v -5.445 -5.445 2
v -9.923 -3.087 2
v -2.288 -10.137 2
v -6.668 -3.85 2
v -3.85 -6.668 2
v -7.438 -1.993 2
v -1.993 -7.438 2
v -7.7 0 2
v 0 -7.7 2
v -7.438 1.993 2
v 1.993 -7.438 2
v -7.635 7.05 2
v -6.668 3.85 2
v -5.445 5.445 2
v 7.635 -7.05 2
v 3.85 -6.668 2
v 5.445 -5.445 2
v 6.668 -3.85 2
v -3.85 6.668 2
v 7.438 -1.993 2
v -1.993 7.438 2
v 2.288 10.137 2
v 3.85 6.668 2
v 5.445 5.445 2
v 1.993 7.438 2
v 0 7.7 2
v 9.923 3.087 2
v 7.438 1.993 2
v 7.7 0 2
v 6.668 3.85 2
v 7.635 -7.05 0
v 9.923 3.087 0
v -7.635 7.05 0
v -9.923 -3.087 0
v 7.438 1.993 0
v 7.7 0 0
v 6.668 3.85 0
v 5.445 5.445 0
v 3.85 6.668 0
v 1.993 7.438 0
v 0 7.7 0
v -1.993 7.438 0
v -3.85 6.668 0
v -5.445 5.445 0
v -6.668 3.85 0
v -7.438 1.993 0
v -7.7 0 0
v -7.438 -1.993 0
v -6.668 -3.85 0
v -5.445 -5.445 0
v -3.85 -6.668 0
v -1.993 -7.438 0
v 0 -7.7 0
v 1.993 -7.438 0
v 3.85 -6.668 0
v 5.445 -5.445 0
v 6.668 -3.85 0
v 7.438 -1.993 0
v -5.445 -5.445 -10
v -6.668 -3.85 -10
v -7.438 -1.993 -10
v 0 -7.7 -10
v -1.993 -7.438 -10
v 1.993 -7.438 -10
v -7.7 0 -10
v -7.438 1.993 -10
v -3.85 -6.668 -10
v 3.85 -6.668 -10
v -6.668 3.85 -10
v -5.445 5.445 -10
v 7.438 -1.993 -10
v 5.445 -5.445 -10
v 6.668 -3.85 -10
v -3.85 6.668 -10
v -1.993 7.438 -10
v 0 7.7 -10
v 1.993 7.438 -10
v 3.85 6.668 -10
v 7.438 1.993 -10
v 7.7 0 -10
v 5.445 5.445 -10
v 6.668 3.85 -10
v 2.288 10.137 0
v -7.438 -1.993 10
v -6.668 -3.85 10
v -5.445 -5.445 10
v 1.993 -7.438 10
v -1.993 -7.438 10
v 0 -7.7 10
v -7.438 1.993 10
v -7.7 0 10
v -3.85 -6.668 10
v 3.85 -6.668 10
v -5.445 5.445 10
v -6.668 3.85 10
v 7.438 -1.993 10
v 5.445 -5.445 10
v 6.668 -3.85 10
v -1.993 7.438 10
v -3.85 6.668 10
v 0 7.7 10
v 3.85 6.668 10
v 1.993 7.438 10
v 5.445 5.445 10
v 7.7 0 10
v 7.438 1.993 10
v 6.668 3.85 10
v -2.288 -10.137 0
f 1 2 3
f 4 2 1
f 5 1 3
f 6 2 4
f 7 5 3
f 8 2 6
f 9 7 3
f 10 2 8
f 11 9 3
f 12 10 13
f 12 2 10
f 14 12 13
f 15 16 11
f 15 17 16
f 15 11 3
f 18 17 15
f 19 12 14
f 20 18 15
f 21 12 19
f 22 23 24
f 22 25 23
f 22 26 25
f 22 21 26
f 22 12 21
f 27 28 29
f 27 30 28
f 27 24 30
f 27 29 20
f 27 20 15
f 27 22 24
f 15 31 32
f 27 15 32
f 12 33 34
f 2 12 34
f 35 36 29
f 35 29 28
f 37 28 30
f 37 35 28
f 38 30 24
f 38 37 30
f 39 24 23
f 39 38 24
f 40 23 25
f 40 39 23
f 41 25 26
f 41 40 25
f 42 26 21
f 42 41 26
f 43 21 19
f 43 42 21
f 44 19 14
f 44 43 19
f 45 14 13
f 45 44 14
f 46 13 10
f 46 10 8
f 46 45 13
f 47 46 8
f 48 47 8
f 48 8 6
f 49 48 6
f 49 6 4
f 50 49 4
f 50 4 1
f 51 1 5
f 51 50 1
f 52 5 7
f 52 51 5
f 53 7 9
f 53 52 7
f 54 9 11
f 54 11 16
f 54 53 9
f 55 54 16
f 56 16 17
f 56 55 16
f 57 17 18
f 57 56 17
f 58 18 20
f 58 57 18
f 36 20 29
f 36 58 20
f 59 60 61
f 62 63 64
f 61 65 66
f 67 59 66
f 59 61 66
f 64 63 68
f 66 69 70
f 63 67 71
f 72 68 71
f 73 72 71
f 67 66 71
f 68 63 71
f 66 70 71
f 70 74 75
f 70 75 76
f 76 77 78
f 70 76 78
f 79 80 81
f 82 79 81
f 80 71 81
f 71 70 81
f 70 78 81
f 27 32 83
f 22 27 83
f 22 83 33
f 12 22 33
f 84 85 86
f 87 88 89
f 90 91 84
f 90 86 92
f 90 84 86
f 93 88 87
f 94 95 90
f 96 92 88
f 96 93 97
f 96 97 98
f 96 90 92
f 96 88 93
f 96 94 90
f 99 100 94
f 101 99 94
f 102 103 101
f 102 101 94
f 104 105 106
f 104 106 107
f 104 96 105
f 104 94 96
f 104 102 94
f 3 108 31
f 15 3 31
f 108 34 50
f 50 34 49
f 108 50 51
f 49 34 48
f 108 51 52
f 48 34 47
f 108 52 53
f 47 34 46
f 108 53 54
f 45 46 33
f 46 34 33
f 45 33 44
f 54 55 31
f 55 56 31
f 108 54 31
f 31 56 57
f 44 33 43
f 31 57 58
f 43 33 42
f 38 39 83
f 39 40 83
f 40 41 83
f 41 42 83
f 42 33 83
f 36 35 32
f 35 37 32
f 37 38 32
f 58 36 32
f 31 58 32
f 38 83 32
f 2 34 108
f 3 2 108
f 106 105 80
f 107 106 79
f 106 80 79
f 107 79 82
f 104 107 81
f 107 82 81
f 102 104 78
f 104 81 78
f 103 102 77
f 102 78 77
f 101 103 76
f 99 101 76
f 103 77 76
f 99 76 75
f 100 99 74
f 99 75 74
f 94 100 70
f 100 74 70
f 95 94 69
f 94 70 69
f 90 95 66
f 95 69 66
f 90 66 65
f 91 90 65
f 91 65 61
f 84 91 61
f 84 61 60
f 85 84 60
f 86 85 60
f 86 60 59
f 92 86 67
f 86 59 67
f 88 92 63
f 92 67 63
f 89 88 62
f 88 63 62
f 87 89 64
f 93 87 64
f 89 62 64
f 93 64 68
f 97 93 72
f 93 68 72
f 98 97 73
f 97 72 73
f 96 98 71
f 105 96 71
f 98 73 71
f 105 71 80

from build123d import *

# Parameters (mm, degrees)
BOSS_EXTRUDE1_DEPTH      = 10
BOSS_EXTRUDE1_DEPTH_BACK = 10
SKETCH1_R                = 7.7
SKETCH1_3_R              = 7.7
BOSS_EXTRUDE2_DEPTH      = 2


with BuildPart() as part:
    # Sketch1 → Boss-Extrude1 (new, two sides: drawn at the far end of the back side and taken through both)
    with BuildSketch(Plane.XY.offset(-BOSS_EXTRUDE1_DEPTH_BACK)):
        Circle(SKETCH1_R)
    extrude(amount=BOSS_EXTRUDE1_DEPTH + BOSS_EXTRUDE1_DEPTH_BACK)


with BuildPart() as body_2:
    # Sketch1<3> → Boss-Extrude2 (new body)
    with BuildSketch(Plane.XY):
        Polygon((-2.287768192, -10.137362413), (7.635329281, -7.049946579), (9.923097473, 3.087415834), (2.287768192, 10.137362413), (-7.635329281, 7.049946579), (-9.923097473, -3.087415834), align=None)
        Circle(SKETCH1_3_R, mode=Mode.SUBTRACT)
    extrude(amount=BOSS_EXTRUDE2_DEPTH)


solid = Compound([part.part, body_2.part])
